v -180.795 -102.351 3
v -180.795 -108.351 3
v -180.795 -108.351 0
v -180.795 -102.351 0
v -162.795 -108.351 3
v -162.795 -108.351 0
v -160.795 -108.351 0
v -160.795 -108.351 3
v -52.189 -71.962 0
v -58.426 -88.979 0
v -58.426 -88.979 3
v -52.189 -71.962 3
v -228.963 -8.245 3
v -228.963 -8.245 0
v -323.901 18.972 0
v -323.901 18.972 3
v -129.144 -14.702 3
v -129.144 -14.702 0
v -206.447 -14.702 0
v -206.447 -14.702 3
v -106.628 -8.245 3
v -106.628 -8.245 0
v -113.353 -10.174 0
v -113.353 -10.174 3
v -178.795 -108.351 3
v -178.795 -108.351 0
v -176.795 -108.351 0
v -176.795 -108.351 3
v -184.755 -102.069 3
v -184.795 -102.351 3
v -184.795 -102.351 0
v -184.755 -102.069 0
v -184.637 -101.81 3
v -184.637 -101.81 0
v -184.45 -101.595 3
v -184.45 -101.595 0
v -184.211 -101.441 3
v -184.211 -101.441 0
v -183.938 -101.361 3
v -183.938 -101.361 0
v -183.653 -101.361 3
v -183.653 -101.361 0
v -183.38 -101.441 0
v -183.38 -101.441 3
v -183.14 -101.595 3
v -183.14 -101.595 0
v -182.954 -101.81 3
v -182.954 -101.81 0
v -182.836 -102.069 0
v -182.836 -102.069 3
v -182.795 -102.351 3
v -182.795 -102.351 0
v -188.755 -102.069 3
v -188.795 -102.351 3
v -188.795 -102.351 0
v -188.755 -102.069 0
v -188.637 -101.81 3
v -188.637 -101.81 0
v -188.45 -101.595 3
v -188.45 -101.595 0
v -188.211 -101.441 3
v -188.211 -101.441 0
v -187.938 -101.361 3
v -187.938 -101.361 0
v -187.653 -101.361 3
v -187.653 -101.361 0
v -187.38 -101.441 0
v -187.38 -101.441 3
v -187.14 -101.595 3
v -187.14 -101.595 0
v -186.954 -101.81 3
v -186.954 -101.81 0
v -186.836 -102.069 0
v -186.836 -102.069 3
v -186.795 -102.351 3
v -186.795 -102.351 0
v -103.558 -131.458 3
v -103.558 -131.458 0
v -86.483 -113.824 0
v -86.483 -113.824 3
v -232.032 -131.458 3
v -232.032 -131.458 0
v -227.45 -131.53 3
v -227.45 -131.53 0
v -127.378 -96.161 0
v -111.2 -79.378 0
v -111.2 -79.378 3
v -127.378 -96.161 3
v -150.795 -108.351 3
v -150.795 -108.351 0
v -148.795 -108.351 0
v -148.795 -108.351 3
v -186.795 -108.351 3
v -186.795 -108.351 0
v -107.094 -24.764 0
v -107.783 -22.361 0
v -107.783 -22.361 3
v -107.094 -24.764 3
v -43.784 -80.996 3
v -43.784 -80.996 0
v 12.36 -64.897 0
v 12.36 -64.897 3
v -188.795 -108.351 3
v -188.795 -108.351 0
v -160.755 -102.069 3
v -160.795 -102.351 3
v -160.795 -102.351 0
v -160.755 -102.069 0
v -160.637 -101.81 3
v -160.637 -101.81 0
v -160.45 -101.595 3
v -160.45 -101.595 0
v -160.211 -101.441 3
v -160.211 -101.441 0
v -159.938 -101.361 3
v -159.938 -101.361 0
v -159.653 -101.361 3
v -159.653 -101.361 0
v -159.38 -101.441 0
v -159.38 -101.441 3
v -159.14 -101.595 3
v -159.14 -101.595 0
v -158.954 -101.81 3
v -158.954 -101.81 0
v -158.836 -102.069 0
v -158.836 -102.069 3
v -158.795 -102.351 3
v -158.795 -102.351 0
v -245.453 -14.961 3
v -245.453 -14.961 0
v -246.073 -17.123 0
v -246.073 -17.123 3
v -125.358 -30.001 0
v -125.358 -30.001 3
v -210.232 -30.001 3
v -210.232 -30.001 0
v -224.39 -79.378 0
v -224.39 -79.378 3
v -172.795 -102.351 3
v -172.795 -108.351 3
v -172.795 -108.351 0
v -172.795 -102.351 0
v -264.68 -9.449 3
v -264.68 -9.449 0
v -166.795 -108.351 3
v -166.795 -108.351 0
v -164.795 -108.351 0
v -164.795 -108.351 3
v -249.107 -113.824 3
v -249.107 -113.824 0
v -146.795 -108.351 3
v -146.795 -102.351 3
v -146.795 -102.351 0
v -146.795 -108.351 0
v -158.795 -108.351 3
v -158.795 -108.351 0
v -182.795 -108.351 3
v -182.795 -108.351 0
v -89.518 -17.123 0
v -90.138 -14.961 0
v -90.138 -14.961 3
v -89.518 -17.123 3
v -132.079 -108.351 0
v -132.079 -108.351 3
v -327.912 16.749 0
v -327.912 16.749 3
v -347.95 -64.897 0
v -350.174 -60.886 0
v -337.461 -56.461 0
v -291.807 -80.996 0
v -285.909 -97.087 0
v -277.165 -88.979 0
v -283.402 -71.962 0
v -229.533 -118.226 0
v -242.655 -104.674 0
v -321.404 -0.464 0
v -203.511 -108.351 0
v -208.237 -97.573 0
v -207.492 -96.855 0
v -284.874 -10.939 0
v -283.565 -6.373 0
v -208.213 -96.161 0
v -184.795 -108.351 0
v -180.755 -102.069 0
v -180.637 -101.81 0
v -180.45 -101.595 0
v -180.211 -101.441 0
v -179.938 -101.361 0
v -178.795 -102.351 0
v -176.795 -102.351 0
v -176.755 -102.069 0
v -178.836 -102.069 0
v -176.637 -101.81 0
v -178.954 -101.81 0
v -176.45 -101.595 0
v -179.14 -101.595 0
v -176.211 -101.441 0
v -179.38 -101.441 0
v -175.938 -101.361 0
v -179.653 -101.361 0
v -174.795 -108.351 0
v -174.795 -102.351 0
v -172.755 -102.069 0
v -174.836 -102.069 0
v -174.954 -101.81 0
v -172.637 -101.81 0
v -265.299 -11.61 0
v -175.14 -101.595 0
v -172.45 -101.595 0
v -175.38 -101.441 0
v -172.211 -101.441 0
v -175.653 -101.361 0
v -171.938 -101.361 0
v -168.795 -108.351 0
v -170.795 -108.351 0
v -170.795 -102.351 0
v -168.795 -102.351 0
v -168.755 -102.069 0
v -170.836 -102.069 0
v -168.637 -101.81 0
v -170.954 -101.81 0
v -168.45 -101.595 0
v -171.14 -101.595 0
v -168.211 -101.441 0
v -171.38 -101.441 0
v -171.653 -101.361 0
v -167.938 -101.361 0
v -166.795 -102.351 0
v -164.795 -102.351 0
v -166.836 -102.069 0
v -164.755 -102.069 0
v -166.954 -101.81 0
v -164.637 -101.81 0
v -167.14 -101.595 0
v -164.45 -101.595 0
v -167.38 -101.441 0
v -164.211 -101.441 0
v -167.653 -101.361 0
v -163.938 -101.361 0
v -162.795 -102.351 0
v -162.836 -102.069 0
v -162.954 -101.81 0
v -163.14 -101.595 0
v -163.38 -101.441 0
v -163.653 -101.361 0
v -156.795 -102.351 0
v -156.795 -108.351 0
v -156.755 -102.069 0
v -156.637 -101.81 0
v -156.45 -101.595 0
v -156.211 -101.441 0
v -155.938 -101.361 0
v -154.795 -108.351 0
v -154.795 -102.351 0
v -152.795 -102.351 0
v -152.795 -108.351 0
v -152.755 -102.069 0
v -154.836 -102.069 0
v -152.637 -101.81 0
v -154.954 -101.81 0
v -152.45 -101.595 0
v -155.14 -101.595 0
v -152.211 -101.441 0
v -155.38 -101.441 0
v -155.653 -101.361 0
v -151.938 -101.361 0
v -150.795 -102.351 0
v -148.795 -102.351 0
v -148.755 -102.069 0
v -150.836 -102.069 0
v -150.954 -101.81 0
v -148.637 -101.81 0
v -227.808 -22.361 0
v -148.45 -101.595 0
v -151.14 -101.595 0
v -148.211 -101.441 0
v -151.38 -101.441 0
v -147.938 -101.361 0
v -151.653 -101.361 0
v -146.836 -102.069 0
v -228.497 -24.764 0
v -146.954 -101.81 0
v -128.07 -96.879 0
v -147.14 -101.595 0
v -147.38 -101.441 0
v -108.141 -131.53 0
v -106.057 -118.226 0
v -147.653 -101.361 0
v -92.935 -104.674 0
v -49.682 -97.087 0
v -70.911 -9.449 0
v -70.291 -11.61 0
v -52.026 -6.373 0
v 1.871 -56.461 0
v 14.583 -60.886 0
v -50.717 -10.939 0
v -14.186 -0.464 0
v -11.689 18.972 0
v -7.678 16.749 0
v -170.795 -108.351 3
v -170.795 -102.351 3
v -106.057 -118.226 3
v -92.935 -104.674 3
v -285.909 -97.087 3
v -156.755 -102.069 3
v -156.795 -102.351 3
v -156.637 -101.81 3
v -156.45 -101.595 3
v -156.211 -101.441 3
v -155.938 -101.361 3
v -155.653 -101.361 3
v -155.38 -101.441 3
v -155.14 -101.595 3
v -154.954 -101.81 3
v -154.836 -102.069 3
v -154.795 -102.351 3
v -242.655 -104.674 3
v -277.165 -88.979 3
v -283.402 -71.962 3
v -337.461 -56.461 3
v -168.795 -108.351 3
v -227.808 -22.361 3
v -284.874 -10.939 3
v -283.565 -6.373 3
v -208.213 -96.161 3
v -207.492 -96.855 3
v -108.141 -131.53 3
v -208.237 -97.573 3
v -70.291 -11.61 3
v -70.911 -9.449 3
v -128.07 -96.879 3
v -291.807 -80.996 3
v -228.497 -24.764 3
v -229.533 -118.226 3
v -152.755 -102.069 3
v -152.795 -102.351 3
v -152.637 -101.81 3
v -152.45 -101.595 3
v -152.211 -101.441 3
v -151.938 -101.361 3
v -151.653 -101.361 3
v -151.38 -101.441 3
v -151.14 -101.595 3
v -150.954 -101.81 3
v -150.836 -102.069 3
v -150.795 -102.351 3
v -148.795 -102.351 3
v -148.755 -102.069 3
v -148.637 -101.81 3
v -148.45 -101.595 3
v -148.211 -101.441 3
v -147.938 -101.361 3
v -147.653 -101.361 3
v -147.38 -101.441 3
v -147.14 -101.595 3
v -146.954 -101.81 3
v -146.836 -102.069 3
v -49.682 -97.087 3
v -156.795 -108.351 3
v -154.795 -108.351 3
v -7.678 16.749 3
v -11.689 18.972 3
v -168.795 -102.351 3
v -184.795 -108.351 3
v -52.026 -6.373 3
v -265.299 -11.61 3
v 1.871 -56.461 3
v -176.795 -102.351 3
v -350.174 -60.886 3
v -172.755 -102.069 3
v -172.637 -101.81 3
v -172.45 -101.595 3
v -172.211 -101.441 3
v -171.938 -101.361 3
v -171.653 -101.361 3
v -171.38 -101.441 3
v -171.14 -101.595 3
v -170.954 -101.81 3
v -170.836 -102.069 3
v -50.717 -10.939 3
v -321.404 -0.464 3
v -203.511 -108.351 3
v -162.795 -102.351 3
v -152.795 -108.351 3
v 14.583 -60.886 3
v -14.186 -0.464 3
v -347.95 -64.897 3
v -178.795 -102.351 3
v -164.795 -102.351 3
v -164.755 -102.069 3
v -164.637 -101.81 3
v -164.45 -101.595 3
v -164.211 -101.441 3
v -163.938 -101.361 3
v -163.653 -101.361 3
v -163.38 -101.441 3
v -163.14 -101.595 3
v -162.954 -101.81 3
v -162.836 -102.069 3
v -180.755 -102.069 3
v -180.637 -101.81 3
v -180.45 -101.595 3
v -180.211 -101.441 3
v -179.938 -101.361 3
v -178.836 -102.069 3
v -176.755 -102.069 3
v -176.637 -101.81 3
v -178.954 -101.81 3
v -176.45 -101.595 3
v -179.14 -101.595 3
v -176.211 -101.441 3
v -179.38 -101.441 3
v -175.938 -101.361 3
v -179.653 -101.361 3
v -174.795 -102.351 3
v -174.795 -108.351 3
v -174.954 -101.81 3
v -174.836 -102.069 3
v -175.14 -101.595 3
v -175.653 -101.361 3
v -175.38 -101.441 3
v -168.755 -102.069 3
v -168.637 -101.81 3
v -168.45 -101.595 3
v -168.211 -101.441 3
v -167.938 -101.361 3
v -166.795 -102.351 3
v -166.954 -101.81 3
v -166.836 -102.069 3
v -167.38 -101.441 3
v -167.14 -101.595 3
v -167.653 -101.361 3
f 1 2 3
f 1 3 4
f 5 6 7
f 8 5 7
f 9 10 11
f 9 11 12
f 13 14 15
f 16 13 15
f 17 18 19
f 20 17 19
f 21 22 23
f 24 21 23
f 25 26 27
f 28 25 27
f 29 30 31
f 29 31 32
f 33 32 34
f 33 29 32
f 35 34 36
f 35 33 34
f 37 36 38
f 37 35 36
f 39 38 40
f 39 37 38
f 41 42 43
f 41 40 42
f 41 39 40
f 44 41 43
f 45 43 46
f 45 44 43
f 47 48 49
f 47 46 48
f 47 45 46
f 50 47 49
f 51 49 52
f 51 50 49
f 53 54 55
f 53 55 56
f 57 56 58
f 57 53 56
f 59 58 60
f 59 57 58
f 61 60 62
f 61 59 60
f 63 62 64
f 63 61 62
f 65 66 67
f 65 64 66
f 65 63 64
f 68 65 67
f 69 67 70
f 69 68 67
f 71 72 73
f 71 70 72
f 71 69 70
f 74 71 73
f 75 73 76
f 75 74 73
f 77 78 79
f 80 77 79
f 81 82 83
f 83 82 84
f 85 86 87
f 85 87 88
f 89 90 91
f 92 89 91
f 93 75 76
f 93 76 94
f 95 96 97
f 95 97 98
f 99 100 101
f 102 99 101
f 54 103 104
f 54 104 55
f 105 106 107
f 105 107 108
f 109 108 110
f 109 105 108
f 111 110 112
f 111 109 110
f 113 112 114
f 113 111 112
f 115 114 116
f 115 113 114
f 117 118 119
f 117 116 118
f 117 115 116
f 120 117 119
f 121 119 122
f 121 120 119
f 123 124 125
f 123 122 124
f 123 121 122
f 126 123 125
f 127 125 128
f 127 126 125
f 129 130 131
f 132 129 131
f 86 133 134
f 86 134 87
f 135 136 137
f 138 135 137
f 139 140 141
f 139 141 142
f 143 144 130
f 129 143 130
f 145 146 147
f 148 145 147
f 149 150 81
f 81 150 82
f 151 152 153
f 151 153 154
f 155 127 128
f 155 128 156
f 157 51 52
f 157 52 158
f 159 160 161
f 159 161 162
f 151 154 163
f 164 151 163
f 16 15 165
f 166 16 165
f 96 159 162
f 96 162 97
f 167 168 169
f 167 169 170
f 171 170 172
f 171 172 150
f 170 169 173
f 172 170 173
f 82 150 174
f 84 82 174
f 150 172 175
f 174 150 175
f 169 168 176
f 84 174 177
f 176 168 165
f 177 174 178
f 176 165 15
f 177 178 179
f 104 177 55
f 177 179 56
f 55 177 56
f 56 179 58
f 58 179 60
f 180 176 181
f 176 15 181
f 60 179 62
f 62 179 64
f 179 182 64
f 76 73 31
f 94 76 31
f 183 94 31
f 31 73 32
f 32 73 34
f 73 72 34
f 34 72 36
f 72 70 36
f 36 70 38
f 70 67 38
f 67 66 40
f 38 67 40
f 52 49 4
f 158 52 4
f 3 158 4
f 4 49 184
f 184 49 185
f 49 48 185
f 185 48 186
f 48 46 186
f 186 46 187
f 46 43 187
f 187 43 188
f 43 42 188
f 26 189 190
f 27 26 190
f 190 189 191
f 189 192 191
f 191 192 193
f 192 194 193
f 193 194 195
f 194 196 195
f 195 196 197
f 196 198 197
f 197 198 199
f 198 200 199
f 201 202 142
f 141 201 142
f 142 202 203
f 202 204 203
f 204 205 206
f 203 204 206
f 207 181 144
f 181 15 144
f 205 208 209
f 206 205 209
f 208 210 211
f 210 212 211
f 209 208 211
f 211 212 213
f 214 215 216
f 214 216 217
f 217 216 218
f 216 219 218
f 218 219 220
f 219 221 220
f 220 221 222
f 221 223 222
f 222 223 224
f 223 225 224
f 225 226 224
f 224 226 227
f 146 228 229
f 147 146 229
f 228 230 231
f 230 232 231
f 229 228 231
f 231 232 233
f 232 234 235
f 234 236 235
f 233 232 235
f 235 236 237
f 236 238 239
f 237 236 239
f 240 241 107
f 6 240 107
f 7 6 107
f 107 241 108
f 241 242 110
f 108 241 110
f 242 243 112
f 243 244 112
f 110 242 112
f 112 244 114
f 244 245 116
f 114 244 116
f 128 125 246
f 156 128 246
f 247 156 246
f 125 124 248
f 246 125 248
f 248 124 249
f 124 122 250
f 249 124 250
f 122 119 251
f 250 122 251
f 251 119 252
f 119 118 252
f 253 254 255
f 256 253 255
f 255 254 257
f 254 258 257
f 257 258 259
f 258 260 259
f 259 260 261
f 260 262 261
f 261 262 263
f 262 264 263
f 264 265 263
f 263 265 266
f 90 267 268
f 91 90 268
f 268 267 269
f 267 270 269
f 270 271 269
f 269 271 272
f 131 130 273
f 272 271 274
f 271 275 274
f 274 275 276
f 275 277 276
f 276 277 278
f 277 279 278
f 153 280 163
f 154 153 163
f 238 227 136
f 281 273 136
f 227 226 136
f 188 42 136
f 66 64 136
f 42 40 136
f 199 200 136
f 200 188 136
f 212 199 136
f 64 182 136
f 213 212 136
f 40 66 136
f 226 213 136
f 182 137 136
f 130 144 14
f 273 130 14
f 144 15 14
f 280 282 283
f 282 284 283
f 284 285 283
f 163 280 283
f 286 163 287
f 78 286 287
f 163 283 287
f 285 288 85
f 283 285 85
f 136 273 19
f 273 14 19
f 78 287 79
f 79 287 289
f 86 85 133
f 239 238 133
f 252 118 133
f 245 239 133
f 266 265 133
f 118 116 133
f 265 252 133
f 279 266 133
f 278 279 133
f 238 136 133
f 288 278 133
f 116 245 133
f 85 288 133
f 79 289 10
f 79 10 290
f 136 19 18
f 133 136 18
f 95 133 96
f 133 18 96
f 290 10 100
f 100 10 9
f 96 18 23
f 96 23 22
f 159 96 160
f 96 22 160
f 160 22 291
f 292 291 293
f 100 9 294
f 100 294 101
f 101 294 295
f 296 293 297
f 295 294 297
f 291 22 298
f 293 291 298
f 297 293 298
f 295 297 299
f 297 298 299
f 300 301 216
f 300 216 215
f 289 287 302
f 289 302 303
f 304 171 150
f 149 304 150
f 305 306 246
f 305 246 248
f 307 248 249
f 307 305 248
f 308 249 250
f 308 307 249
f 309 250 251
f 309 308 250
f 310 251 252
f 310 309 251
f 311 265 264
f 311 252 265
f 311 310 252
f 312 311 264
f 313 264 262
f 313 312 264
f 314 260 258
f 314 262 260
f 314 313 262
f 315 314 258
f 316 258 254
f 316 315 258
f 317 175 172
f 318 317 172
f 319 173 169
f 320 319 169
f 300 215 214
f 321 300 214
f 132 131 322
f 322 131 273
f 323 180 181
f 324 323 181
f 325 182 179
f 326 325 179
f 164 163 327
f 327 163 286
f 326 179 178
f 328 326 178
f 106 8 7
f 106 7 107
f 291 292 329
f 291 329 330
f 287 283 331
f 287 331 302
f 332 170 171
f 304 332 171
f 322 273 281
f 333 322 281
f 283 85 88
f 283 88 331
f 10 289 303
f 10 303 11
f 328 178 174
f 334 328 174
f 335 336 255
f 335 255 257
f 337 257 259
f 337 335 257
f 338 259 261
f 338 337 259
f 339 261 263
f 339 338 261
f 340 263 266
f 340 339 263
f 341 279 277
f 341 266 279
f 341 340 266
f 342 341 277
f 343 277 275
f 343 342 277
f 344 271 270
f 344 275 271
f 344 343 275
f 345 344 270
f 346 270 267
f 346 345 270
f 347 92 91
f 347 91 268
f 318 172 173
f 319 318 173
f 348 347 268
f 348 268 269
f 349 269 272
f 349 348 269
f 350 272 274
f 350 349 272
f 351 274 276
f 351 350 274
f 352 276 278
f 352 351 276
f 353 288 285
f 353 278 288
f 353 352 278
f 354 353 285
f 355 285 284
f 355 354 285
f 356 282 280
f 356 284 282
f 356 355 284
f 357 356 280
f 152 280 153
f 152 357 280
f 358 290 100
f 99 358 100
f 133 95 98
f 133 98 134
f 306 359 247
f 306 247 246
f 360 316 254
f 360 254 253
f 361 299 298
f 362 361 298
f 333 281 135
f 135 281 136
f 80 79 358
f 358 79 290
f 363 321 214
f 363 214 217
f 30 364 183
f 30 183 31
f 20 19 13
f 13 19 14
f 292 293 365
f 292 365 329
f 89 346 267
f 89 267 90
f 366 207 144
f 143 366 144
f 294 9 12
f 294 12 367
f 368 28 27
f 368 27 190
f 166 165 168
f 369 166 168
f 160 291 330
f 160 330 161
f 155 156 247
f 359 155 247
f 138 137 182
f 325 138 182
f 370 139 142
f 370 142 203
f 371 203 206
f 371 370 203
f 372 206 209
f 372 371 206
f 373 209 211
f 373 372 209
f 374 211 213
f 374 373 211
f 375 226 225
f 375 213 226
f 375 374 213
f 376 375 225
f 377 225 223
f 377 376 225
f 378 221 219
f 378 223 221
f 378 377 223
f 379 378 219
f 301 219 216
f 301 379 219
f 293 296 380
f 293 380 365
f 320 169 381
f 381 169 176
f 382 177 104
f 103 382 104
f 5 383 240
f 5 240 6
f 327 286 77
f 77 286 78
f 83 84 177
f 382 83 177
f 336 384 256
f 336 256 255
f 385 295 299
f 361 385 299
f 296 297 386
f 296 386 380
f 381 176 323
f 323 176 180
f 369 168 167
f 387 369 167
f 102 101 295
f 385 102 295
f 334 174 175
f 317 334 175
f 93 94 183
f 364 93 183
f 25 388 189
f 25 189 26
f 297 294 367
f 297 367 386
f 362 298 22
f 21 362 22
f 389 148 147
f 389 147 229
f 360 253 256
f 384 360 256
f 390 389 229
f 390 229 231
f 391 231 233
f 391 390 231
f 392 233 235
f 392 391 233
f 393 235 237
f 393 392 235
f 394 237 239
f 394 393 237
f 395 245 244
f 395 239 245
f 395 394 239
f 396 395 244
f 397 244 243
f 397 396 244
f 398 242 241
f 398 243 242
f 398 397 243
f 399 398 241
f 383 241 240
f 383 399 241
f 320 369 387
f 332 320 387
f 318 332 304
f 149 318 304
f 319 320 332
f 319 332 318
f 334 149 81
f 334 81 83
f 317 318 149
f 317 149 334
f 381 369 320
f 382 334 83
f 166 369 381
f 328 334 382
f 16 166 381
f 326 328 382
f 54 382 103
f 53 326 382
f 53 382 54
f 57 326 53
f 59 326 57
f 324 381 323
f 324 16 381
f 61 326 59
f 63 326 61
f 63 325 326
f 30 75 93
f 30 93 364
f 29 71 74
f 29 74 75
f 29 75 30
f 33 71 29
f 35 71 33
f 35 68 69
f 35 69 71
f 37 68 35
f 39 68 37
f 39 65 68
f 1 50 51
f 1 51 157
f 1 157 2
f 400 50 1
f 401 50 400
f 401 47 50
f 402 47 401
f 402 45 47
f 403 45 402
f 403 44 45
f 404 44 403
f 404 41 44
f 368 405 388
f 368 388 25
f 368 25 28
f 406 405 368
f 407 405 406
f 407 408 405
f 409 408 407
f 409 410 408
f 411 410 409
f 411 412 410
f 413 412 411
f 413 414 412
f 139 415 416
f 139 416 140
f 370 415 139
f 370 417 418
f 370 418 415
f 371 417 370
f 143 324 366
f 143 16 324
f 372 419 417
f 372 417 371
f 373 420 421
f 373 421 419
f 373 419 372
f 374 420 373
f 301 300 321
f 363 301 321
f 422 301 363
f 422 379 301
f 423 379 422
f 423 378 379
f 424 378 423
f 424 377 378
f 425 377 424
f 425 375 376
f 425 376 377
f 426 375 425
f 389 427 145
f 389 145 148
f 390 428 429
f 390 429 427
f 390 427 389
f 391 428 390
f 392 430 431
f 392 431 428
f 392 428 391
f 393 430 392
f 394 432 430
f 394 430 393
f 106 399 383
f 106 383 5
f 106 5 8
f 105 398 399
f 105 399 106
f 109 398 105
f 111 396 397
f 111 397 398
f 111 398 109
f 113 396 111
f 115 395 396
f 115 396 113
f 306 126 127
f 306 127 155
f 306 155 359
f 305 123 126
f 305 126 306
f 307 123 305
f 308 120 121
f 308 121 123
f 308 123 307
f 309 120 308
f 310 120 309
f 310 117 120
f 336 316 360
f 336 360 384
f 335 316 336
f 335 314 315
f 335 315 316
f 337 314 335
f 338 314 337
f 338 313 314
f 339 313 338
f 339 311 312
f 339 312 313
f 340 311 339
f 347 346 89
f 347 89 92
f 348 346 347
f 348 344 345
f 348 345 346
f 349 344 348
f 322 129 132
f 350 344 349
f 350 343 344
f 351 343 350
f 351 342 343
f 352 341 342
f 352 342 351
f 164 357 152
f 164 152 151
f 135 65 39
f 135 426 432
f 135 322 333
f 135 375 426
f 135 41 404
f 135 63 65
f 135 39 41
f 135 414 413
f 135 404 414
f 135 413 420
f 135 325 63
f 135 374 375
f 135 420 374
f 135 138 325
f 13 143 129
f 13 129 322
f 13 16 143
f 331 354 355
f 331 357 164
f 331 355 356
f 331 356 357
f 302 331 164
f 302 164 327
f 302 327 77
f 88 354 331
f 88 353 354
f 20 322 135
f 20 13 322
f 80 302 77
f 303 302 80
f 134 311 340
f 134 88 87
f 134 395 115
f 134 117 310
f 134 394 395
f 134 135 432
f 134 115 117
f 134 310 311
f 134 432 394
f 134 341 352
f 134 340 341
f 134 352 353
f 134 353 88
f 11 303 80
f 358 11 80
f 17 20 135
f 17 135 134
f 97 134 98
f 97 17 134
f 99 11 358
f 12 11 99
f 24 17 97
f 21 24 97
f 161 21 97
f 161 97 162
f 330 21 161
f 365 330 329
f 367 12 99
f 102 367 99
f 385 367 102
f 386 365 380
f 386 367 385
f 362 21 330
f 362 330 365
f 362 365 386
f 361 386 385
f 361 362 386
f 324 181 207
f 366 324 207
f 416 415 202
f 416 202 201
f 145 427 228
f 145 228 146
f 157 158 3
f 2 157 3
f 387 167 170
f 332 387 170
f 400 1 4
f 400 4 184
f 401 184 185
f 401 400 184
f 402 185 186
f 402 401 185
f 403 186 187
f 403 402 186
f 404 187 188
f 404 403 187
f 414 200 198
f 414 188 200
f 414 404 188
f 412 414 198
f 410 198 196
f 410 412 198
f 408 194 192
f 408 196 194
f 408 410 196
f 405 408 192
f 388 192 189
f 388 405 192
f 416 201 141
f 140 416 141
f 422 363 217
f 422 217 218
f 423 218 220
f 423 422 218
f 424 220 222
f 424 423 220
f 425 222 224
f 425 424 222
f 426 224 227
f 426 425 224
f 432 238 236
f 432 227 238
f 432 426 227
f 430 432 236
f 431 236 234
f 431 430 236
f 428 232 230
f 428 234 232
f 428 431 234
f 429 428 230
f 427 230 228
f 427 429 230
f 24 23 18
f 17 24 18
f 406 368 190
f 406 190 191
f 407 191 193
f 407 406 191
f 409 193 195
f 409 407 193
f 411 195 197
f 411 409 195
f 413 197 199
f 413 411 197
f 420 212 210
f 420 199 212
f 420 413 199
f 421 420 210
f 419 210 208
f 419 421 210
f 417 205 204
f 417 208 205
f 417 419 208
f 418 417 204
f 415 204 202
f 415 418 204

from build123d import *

# Parameters (mm, degrees)
BOSS_EXTRU_1_DEPTH      = 3
ENL_V_MAT_EXTRU_1_DEPTH = 10


with BuildPart() as part:
    # Esquisse1 → Boss.-Extru.1 (new body)
    with BuildSketch(Plane.XY):
        Polygon((-129.143746737, -14.701531345), (-206.446773007, -14.701531345), (-222.237416003, -10.173637327), (-228.962816583, -8.245159743), (-323.901077775, 18.972234266), (-327.912092601, 16.748746626), (-350.173506381, -60.88602933), (-347.950273, -64.896848521), (-291.80662177, -80.995781451), (-285.908889082, -97.08692424), (-249.107067355, -113.823629959), (-232.032352152, -131.457901649), (-227.449883961, -131.529994355), (-203.511236428, -108.350948678), (-132.079283315, -108.350948678), (-108.140635782, -131.529994355), (-103.558167591, -131.457901649), (-86.483452388, -113.823629959), (-49.681630661, -97.08692424), (-43.783897973, -80.995781451), (12.359753257, -64.896848521), (14.582986638, -60.88602933), (-7.678427142, 16.748746626), (-11.689441968, 18.972234266), (-106.627703159, -8.245159743), (-113.35310374, -10.173637327), align=None)
        Polygon((-128.0696158, -96.878899722), (-106.057456456, -118.225792128), (-92.935433745, -104.673746846), (-58.425639792, -88.979407851), (-52.188593581, -71.96249534), (1.870889973, -56.461187875), (-14.186085737, -0.463858857), (-50.716621092, -10.938821309), (-52.025991399, -6.372504389), (-70.291259076, -11.609985616), (-70.910965859, -9.448811229), (-90.137733677, -14.960840928), (-89.517720268, -17.123084647), (-107.782987945, -22.360565873), (-107.093845678, -24.763890567), (-125.358331696, -30.001147656), (-111.200088958, -79.377961929), (-127.377713529, -96.161100182), align=None, mode=Mode.SUBTRACT)
        Polygon((-224.390430785, -79.377961929), (-208.212806214, -96.161100182), (-207.491865187, -96.85509979), (-208.236606037, -97.572971364), (-229.533063287, -118.225792128), (-242.655085998, -104.673746846), (-277.164879951, -88.979407851), (-283.401926162, -71.96249534), (-337.461409717, -56.461187875), (-321.404434006, -0.463858857), (-284.873898651, -10.938821309), (-283.564528345, -6.372504389), (-265.299260667, -11.609985616), (-264.679553884, -9.448811229), (-245.452786066, -14.960840928), (-246.072799476, -17.123084647), (-227.807531798, -22.360565873), (-228.496674065, -24.763890567), (-210.232188047, -30.001147656), align=None, mode=Mode.SUBTRACT)
    extrude(amount=BOSS_EXTRU_1_DEPTH)

    # Esquisse2 → Enlèv. mat.-Extru.1 (cut)
    with BuildSketch(Plane.XY.offset(3)):
        with BuildLine():
            Line((-168.795259872, -108.350948678), (-168.795259872, -102.350948678))
            ThreePointArc((-168.795259872, -102.350948678), (-167.795259872, -101.350948678), (-166.795259872, -102.350948678))
            Line((-166.795259872, -102.350948678), (-166.795259872, -108.350948678))
            ThreePointArc((-166.795259872, -108.350948678), (-167.795259872, -109.350948678), (-168.795259872, -108.350948678))
        make_face()
        with BuildLine():
            Line((-164.795259872, -108.350948678), (-164.795259872, -102.350948678))
            ThreePointArc((-164.795259872, -102.350948678), (-163.795259872, -101.350948678), (-162.795259872, -102.350948678))
            Line((-162.795259872, -102.350948678), (-162.795259872, -108.350948678))
            ThreePointArc((-162.795259872, -108.350948678), (-163.795259872, -109.350948678), (-164.795259872, -108.350948678))
        make_face()
        with BuildLine():
            Line((-160.795259872, -108.350948678), (-160.795259872, -102.350948678))
            ThreePointArc((-160.795259872, -102.350948678), (-159.795259872, -101.350948678), (-158.795259872, -102.350948678))
            Line((-158.795259872, -102.350948678), (-158.795259872, -108.350948678))
            ThreePointArc((-158.795259872, -108.350948678), (-159.795259872, -109.350948678), (-160.795259872, -108.350948678))
        make_face()
        with BuildLine():
            Line((-156.795259872, -108.350948678), (-156.795259872, -102.350948678))
            ThreePointArc((-156.795259872, -102.350948678), (-155.795259872, -101.350948678), (-154.795259872, -102.350948678))
            Line((-154.795259872, -102.350948678), (-154.795259872, -108.350948678))
            ThreePointArc((-154.795259872, -108.350948678), (-155.795259872, -109.350948678), (-156.795259872, -108.350948678))
        make_face()
        with BuildLine():
            Line((-152.795259872, -108.350948678), (-152.795259872, -102.350948678))
            ThreePointArc((-152.795259872, -102.350948678), (-151.795259872, -101.350948678), (-150.795259872, -102.350948678))
            Line((-150.795259872, -102.350948678), (-150.795259872, -108.350948678))
            ThreePointArc((-150.795259872, -108.350948678), (-151.795259872, -109.350948678), (-152.795259872, -108.350948678))
        make_face()
        with BuildLine():
            Line((-148.795259872, -108.350948678), (-148.795259872, -102.350948678))
            ThreePointArc((-148.795259872, -102.350948678), (-147.795259872, -101.350948678), (-146.795259872, -102.350948678))
            Line((-146.795259872, -102.350948678), (-146.795259872, -108.350948678))
            ThreePointArc((-146.795259872, -108.350948678), (-147.795259872, -109.350948678), (-148.795259872, -108.350948678))
        make_face()
        with BuildLine():
            Line((-172.795259872, -108.350948678), (-172.795259872, -102.350948678))
            ThreePointArc((-172.795259872, -102.350948678), (-171.795259872, -101.350948678), (-170.795259872, -102.350948678))
            Line((-170.795259872, -102.350948678), (-170.795259872, -108.350948678))
            ThreePointArc((-170.795259872, -108.350948678), (-171.795259872, -109.350948678), (-172.795259872, -108.350948678))
        make_face()
        with BuildLine():
            Line((-176.795259872, -108.350948678), (-176.795259872, -102.350948678))
            ThreePointArc((-176.795259872, -102.350948678), (-175.795259872, -101.350948678), (-174.795259872, -102.350948678))
            Line((-174.795259872, -102.350948678), (-174.795259872, -108.350948678))
            ThreePointArc((-174.795259872, -108.350948678), (-175.795259872, -109.350948678), (-176.795259872, -108.350948678))
        make_face()
        with BuildLine():
            Line((-180.795259872, -108.350948678), (-180.795259872, -102.350948678))
            ThreePointArc((-180.795259872, -102.350948678), (-179.795259872, -101.350948678), (-178.795259872, -102.350948678))
            Line((-178.795259872, -102.350948678), (-178.795259872, -108.350948678))
            ThreePointArc((-178.795259872, -108.350948678), (-179.795259872, -109.350948678), (-180.795259872, -108.350948678))
        make_face()
        with BuildLine():
            Line((-184.795259872, -108.350948678), (-184.795259872, -102.350948678))
            ThreePointArc((-184.795259872, -102.350948678), (-183.795259872, -101.350948678), (-182.795259872, -102.350948678))
            Line((-182.795259872, -102.350948678), (-182.795259872, -108.350948678))
            ThreePointArc((-182.795259872, -108.350948678), (-183.795259872, -109.350948678), (-184.795259872, -108.350948678))
        make_face()
        with BuildLine():
            Line((-188.795259872, -108.350948678), (-188.795259872, -102.350948678))
            ThreePointArc((-188.795259872, -102.350948678), (-187.795259872, -101.350948678), (-186.795259872, -102.350948678))
            Line((-186.795259872, -102.350948678), (-186.795259872, -108.350948678))
            ThreePointArc((-186.795259872, -108.350948678), (-187.795259872, -109.350948678), (-188.795259872, -108.350948678))
        make_face()
    extrude(amount=-ENL_V_MAT_EXTRU_1_DEPTH, mode=Mode.SUBTRACT)


solid = part.part
